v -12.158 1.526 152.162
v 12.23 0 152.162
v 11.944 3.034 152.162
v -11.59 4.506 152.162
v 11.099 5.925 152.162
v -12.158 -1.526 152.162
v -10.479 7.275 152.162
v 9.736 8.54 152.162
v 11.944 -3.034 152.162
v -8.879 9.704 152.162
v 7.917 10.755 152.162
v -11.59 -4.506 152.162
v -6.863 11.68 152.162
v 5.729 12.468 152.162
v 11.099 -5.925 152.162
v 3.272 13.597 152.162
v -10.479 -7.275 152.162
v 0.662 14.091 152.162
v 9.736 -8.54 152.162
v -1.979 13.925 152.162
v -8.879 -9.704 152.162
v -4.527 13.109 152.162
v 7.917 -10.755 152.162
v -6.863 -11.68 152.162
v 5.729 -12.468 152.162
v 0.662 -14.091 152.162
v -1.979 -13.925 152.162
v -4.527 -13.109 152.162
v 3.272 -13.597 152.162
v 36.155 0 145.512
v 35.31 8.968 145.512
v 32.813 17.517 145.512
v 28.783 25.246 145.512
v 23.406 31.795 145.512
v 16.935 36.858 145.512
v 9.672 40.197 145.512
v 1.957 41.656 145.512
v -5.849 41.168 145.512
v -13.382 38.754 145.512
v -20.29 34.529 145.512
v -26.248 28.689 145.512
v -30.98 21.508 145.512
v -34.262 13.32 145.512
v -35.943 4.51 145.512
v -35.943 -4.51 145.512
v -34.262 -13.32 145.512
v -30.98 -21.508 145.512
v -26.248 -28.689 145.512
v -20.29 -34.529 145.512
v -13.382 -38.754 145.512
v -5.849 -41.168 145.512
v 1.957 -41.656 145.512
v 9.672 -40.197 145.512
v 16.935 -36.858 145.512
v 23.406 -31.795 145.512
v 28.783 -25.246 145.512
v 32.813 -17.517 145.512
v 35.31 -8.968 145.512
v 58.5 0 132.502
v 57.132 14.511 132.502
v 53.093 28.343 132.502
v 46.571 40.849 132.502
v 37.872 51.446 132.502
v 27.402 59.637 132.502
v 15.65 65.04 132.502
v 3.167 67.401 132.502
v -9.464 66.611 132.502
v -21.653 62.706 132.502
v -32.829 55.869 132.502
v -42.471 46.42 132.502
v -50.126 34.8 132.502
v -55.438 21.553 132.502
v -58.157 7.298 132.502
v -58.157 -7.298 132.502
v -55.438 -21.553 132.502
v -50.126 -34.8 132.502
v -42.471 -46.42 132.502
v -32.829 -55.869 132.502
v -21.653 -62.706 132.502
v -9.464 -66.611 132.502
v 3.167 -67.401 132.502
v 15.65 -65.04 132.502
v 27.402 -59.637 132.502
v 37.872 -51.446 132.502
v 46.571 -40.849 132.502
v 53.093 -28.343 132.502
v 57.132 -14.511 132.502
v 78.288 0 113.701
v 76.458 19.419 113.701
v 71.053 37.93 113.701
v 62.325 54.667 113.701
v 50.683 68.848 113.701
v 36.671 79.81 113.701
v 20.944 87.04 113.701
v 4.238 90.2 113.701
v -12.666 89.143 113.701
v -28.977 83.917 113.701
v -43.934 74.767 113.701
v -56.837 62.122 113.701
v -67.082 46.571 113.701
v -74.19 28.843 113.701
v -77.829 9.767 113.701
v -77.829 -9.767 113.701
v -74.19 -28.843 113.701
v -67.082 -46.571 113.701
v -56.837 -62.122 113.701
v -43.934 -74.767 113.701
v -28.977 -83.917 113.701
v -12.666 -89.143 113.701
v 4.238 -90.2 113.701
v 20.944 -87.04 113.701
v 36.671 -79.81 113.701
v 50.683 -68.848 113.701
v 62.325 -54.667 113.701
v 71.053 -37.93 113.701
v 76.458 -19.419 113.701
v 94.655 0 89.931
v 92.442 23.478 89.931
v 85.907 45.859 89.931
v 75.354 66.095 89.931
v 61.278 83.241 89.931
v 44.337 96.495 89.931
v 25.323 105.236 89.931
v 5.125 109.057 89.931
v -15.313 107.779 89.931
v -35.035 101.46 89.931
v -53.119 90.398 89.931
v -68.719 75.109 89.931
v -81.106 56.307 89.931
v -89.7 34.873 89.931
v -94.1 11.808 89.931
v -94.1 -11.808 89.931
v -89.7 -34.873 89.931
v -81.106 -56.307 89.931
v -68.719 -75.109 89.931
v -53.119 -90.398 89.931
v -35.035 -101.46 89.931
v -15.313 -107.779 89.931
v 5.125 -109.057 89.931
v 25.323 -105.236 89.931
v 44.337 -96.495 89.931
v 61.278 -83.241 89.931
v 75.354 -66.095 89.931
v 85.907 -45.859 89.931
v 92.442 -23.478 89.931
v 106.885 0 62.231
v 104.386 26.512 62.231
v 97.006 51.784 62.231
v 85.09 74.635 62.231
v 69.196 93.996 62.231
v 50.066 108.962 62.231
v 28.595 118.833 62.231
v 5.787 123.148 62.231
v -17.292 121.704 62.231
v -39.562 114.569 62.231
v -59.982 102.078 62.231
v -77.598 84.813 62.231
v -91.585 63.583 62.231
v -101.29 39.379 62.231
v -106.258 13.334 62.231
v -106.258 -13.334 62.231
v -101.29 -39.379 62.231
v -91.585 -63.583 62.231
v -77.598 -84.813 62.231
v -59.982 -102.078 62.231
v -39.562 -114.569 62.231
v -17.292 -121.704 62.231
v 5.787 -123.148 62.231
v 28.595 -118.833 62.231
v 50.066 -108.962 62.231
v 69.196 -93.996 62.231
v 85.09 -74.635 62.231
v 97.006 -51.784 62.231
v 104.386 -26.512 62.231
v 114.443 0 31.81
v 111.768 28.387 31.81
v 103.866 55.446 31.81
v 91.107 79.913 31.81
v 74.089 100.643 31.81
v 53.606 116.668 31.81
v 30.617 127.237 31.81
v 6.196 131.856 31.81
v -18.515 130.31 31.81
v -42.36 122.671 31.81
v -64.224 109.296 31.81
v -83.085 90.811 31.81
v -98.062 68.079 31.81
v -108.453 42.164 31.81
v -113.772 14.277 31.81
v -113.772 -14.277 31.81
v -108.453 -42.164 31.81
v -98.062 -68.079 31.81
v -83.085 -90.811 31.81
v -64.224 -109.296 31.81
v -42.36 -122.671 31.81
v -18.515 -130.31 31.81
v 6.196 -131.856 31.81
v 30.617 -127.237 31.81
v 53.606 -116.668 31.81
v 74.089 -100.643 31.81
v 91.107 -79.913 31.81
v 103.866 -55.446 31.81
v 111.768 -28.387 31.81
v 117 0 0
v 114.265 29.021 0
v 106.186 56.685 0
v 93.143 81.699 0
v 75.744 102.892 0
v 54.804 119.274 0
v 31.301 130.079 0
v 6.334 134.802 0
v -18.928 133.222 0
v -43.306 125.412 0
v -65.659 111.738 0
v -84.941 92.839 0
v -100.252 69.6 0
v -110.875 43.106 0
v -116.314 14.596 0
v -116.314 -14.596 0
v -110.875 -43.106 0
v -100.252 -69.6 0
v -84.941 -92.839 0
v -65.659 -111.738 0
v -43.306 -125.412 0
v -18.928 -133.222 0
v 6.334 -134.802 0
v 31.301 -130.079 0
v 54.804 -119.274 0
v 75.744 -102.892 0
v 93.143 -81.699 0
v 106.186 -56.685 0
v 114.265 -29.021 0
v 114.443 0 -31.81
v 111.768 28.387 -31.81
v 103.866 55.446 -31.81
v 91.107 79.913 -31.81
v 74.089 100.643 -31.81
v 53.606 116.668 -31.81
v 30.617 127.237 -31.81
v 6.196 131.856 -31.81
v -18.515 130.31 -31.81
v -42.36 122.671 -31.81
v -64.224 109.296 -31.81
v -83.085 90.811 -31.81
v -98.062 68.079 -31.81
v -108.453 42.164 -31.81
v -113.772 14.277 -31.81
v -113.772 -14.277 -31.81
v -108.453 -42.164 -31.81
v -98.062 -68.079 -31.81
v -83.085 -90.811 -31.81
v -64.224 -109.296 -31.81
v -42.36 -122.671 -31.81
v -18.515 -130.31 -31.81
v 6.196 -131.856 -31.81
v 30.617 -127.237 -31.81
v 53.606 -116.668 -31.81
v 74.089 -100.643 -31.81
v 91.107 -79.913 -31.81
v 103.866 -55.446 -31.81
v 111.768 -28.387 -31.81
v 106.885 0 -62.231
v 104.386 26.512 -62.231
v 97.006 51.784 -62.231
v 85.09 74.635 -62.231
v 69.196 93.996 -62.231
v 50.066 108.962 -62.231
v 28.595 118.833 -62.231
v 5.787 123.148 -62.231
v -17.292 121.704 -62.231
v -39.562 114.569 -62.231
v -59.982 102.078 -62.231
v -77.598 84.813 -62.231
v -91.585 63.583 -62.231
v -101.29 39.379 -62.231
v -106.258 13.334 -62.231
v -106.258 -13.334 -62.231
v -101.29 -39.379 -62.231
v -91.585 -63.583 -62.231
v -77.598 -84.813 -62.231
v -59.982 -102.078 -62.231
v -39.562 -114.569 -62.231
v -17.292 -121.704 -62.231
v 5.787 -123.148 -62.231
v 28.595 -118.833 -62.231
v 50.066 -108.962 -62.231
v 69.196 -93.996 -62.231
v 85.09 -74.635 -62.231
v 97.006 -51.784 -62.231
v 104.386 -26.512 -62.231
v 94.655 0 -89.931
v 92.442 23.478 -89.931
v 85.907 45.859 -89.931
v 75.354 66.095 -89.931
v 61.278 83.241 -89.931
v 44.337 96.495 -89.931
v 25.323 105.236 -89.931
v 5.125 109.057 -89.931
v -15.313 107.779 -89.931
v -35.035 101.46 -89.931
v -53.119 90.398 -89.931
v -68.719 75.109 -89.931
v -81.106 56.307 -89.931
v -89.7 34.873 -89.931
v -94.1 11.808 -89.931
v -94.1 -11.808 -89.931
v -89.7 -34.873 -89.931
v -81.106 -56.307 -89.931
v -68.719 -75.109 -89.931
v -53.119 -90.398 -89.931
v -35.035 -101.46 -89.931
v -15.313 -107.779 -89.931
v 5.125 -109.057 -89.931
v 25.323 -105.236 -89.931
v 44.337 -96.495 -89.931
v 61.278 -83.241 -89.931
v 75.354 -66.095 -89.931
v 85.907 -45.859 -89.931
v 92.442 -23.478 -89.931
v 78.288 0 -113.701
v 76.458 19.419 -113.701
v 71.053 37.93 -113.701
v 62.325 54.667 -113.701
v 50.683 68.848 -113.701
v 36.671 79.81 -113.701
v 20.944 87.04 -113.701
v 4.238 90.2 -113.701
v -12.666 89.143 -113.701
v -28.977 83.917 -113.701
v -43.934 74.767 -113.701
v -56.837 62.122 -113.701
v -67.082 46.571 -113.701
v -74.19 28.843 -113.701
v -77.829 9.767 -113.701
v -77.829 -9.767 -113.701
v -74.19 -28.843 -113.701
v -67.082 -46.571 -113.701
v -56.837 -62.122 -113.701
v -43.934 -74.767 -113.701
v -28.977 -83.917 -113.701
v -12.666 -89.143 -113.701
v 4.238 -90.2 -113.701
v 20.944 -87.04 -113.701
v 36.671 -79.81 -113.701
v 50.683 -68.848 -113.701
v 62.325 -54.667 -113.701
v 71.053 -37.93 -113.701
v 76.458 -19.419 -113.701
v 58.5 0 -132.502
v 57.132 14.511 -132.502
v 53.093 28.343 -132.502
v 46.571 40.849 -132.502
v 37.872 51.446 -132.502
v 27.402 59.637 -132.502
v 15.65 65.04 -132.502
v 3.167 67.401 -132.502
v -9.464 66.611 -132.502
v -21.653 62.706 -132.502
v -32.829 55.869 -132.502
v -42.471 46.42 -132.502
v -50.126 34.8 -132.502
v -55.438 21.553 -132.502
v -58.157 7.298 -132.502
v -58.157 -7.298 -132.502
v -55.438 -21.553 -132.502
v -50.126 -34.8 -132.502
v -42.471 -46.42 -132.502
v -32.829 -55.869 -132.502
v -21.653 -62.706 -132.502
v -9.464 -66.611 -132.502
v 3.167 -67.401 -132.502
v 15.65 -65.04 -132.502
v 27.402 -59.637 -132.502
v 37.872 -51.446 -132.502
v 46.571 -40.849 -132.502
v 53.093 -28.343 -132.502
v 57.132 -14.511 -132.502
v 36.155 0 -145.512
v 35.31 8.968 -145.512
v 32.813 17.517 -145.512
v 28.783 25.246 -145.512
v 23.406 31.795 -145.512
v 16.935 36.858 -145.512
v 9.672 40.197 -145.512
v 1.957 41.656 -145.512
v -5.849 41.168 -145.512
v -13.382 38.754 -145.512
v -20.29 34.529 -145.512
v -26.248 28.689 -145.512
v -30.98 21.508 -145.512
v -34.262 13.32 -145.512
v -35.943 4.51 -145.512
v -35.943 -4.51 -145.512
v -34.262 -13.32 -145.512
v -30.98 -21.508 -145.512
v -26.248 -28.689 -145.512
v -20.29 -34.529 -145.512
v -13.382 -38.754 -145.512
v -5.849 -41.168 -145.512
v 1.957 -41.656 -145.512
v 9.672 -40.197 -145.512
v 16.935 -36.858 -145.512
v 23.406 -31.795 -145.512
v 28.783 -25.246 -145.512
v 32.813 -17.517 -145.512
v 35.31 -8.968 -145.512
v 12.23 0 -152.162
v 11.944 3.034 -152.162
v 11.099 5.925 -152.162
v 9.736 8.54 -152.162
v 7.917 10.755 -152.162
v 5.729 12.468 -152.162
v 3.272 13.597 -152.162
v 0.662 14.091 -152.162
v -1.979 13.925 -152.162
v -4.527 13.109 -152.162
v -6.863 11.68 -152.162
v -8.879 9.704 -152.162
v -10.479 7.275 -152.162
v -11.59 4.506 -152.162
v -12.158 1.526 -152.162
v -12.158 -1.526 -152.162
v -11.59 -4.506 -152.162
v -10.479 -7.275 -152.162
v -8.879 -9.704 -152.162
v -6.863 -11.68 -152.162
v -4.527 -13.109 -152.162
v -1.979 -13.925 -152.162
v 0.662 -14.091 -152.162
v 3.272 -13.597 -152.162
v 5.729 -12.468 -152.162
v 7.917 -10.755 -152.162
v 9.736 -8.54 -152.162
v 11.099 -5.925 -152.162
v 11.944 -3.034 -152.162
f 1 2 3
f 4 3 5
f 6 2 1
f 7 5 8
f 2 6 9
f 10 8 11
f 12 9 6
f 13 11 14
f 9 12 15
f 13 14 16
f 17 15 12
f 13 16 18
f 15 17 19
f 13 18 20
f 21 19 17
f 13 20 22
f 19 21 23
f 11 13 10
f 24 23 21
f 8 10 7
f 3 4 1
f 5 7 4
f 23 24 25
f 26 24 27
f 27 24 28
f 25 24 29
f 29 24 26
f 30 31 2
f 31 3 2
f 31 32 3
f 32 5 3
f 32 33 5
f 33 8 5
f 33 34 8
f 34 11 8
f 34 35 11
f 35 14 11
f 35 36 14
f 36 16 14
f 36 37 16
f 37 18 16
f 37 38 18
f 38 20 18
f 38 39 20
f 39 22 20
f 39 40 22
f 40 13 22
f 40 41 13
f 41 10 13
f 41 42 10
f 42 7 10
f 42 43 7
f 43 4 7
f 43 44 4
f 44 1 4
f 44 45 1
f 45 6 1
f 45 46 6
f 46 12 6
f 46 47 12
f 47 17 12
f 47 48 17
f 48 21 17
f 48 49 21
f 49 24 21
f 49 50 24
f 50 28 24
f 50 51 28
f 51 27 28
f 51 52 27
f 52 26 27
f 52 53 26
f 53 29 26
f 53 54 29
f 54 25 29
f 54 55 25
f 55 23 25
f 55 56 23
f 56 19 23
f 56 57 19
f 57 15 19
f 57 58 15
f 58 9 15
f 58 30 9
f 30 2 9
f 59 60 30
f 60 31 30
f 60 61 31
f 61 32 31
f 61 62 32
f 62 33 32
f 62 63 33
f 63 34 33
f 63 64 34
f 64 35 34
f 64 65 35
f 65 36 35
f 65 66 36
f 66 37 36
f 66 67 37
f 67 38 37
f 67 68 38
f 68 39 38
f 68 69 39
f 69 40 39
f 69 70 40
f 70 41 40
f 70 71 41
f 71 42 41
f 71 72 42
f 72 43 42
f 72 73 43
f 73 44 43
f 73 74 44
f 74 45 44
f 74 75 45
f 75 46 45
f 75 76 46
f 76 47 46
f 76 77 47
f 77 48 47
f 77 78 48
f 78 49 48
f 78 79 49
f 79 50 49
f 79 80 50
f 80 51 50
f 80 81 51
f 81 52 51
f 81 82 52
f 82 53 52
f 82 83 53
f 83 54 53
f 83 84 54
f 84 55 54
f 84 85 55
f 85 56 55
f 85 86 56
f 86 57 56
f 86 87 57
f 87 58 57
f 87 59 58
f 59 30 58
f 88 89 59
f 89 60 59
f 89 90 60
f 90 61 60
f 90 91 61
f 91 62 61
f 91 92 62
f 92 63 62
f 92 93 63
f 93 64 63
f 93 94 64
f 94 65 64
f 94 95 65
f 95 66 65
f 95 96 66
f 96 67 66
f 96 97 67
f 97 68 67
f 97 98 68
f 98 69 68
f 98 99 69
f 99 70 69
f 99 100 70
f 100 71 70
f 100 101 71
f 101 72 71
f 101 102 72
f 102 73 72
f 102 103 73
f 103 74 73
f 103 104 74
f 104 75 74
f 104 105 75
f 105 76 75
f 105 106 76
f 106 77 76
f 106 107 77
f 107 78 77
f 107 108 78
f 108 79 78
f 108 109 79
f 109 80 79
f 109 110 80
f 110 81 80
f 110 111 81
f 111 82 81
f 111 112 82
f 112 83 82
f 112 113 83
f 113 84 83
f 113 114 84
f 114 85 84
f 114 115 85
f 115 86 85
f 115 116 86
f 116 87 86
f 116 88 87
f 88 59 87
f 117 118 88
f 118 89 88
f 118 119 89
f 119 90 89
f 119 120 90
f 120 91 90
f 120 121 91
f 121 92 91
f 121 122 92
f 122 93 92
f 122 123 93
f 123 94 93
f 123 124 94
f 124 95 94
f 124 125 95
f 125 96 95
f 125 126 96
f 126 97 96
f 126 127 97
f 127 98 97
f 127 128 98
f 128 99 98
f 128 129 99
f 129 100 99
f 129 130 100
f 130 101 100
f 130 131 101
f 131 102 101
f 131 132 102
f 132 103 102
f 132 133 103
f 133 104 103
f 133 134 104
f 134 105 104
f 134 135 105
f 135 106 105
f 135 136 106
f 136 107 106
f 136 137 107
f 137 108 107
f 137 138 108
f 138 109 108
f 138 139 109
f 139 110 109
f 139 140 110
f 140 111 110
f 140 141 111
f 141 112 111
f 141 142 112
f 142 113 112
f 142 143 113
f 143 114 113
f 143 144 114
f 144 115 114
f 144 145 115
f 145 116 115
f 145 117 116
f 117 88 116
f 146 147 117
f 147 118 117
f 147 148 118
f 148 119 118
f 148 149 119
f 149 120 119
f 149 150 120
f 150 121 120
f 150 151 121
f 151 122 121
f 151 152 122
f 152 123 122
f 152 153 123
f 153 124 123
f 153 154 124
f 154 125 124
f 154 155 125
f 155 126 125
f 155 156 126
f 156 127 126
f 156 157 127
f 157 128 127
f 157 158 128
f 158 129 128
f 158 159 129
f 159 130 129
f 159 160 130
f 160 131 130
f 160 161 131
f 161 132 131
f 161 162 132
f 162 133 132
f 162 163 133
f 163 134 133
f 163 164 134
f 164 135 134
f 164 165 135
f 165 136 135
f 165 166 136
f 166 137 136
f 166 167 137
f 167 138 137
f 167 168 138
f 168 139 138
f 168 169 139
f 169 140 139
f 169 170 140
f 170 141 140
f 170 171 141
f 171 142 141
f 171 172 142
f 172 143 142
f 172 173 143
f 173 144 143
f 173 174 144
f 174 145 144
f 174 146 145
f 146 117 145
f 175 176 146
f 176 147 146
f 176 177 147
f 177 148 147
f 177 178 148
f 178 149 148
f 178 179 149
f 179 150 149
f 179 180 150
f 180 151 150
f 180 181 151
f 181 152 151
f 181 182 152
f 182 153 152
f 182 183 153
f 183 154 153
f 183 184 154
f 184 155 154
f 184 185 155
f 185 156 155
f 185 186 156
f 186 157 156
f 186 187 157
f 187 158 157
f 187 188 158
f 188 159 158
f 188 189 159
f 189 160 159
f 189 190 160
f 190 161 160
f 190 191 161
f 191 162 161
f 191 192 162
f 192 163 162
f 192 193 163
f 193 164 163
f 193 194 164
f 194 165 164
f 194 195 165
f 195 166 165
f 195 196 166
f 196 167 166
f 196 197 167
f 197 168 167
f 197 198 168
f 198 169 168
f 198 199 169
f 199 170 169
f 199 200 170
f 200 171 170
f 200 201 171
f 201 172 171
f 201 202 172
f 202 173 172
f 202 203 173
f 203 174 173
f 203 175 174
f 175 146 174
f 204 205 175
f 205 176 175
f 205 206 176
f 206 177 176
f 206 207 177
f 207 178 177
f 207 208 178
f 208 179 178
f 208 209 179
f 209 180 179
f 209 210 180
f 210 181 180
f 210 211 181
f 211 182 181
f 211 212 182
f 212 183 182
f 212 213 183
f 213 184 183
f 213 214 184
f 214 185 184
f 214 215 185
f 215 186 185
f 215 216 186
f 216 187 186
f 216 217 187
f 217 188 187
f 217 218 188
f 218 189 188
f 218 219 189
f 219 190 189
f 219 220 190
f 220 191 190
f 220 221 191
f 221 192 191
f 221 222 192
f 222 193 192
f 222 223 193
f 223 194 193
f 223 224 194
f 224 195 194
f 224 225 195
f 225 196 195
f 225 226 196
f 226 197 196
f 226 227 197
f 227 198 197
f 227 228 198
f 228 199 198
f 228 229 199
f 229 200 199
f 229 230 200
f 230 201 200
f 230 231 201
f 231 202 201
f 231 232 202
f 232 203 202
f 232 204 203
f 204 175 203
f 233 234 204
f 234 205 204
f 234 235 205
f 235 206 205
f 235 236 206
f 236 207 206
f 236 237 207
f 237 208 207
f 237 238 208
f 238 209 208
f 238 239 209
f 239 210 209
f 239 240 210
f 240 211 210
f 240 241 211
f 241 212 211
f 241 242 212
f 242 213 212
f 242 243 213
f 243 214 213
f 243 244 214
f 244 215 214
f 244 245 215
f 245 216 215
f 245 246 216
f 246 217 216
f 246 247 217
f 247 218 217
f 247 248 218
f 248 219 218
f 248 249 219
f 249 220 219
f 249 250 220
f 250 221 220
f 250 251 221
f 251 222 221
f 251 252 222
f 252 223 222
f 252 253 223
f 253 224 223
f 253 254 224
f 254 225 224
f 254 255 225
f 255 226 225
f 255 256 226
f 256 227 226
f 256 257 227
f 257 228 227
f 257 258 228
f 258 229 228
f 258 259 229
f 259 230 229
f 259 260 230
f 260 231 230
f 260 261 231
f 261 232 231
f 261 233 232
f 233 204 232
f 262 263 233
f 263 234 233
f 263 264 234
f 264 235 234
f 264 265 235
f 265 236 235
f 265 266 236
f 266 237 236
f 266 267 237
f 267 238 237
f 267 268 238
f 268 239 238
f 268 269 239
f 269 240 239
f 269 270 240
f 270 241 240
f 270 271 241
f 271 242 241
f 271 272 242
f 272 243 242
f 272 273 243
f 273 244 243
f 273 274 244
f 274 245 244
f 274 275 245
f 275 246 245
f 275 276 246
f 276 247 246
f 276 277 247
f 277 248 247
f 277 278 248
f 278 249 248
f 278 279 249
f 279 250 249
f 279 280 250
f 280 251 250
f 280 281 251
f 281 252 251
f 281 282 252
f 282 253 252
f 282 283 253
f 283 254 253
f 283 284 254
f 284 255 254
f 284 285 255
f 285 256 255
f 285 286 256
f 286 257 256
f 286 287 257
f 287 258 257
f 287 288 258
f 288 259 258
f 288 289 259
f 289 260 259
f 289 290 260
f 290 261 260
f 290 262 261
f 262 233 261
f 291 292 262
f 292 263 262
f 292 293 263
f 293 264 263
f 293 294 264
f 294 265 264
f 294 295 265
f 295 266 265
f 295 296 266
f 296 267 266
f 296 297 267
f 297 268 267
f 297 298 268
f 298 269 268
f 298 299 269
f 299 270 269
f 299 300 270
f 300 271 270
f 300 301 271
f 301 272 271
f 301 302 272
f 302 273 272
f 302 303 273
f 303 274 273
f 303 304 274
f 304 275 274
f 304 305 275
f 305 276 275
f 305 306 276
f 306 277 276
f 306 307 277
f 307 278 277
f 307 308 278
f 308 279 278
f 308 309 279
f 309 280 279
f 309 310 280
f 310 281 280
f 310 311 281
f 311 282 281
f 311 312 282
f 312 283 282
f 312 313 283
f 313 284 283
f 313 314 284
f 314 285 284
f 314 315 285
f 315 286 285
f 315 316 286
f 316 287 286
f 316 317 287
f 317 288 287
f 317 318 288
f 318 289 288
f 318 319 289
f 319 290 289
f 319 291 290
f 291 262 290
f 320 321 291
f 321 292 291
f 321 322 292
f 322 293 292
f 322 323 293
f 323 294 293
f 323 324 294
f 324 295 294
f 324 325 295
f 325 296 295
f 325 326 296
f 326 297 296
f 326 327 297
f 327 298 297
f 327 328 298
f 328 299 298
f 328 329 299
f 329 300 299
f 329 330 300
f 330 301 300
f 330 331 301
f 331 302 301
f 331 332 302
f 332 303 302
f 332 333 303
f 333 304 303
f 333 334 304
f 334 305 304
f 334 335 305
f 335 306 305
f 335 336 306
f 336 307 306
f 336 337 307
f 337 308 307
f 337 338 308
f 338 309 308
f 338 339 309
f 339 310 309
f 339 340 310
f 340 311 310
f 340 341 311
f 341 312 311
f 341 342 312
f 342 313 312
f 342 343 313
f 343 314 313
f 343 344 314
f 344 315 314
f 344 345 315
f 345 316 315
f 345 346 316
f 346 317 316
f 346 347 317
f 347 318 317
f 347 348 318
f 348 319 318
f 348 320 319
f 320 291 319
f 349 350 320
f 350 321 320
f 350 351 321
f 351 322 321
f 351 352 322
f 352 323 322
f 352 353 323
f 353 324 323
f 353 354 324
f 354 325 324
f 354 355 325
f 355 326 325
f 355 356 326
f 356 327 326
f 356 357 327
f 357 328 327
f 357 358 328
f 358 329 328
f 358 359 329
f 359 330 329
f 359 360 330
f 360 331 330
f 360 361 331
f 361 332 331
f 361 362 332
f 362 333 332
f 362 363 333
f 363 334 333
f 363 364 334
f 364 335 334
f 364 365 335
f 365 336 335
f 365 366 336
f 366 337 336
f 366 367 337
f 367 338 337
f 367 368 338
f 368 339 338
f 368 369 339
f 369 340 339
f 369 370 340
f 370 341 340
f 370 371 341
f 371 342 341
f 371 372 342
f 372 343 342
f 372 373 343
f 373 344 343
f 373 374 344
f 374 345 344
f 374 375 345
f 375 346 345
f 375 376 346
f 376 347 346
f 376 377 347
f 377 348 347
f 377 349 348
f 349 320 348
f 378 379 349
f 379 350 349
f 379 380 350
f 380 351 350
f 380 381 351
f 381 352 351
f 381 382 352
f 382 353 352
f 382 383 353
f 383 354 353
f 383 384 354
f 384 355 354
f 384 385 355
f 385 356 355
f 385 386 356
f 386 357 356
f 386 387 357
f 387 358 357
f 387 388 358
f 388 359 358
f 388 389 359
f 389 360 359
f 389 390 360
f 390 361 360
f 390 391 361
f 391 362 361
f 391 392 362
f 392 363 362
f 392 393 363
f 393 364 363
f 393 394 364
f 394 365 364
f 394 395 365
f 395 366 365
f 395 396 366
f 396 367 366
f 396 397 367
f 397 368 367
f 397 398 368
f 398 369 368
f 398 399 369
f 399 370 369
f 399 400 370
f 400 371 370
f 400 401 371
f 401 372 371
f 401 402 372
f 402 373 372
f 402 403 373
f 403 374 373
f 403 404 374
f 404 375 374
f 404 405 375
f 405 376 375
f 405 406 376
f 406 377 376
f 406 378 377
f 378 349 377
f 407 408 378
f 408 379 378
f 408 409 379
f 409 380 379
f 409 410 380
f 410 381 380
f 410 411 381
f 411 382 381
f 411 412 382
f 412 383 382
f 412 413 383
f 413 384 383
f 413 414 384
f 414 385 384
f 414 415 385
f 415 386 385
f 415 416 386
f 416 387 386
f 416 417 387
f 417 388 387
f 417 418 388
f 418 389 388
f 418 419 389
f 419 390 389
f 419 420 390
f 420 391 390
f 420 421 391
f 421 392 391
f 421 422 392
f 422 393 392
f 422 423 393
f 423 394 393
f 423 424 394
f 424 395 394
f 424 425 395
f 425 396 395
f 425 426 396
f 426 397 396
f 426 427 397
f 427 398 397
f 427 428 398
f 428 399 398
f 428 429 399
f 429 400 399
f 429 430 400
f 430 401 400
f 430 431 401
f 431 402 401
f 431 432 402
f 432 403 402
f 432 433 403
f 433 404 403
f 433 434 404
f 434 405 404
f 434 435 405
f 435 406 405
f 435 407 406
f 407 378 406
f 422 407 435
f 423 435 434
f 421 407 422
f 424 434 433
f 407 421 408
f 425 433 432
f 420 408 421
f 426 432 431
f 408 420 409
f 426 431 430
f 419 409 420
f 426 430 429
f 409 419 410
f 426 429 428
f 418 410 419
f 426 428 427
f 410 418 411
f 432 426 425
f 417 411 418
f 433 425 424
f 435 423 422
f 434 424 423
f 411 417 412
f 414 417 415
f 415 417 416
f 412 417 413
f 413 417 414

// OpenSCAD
// Generated by SolidPython 1.0.1 on 2020-07-29 00:46:51


scale(v = [13, 15, 17]) {
	sphere(r = 9);
}
/***********************************************
*********      SolidPython code:      **********
************************************************
 
# import packages: SolidPython
from solid import *
from solid.utils import *
from itertools import chain, combinations, permutations


class Resize:

    def __init__(self, scad_file):
        self.scad_file = scad_file
        #self.scad_file = import_scad(scad_file)
        # cone/cylinder param:
        self.r1 = 0
        self.r2 = 0
        self.h = 0
        # rectangular prism param:
        self.w = 0
        self.l = 0
        # ellipse param:
        self.r = 0

    # import OpenScad code (file name corresponds to shape)


    # classify shape + parameters
    def assign(self, param1, param2, param3):
        if self.scad_file == 'cone.scad':
            self.r1 = param1
            self.r2 = param2
            self.h = param3
        elif self.scad_file == 'cylinder.scad':
            self.r1 = param1
            self.r2 = param2
            self.h = param3
        elif self.scad_file == 'rectangularPrism.scad':
            self.h = param1
            self.l = param2
            self.w = param3
        else:
            self.r = param1
            self.h = param2

    # resize parameters
    def iterate(self):
        x = range(3, 20, 2)
        i = 1
        if self.scad_file == 'cone.scad':
            tempList = list(permutations(x, 2))
            for temp in tempList:
                param1 = temp[0]
                param2 = temp[1]
                filepath = 'produced_scad_files/' + 'cone' + str(param1) + '_' + str(param2) + '_' + '.scad'
                scad_render_to_file(cylinder(h=param1, r1=param2, r2=0), filepath)

        elif self.scad_file == 'cylinder.scad':
            tempList = list(permutations(x, 3))
            for temp in tempList:
                param1 = temp[0]
                param2 = temp[1]
                filepath = 'produced_scad_files/' + 'cylinder' + str(param1) + '_' + str(param2) + '_' + '.scad'
                scad_render_to_file(cylinder(h=param1, r1=param2, r2=param2), filepath)

        elif self.scad_file == 'rectangularPrism.scad':
            tempList = list(permutations(x, 3))
            for temp in tempList:
                param1 = temp[0]
                param2 = temp[1]
                param3 = temp[2]
                filepath = 'produced_scad_files/' + 'rectangularPrism' + str(param1) + '_' + str(param2) + '_' + str(
                    param3) + '.scad'
                scad_render_to_file(cube(size=(param1, param2, param3)), filepath)

        elif self.scad_file == 'ellipse.scad':
            tempList = list(permutations(x, 4))
            for temp in tempList:
                param1 = temp[0]
                param2 = temp[1]
                param3 = temp[2]
                param4 = temp[3]
                filepath = 'produced_scad_files/' + 'ellipse' + str(param1) + '_' + str(param2) + '_' + str(param3) + '_' + str(param4) + '.scad'
                scad_render_to_file(scale([param1, param2, param3])(sphere(r=param4)), filepath)

    def render_to_scadfile(self):
        scad_render_to_file(scad, 'example.scad') 
 
************************************************/
